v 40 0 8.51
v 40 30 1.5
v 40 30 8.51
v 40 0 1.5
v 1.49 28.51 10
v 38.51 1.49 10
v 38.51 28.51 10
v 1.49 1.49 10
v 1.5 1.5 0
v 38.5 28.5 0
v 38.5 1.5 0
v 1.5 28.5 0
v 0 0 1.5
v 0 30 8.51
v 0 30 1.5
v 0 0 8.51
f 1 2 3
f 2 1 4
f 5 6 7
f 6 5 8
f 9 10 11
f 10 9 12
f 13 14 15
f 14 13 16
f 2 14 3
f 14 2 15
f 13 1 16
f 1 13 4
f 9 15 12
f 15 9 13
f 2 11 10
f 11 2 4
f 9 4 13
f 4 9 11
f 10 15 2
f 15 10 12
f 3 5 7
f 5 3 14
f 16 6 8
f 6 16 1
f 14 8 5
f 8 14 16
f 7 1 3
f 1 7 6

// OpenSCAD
// units=mm — generated by scad_emitter.py
// part=unnamed
$fn = 48;

intersection() { cube([40, 30, 10]); hull() { translate([1.5, 1.5, 0]) linear_extrude(height=0.01) offset(r=0) square([37, 27]); translate([0, 0, 1.5]) linear_extrude(height=0.01) offset(r=0) square([40, 30]); translate([1.5, 1.5, 10]) linear_extrude(height=0.01) offset(r=0) square([37, 27]); translate([0, 0, 8.5]) linear_extrude(height=0.01) offset(r=0) square([40, 30]); } }
